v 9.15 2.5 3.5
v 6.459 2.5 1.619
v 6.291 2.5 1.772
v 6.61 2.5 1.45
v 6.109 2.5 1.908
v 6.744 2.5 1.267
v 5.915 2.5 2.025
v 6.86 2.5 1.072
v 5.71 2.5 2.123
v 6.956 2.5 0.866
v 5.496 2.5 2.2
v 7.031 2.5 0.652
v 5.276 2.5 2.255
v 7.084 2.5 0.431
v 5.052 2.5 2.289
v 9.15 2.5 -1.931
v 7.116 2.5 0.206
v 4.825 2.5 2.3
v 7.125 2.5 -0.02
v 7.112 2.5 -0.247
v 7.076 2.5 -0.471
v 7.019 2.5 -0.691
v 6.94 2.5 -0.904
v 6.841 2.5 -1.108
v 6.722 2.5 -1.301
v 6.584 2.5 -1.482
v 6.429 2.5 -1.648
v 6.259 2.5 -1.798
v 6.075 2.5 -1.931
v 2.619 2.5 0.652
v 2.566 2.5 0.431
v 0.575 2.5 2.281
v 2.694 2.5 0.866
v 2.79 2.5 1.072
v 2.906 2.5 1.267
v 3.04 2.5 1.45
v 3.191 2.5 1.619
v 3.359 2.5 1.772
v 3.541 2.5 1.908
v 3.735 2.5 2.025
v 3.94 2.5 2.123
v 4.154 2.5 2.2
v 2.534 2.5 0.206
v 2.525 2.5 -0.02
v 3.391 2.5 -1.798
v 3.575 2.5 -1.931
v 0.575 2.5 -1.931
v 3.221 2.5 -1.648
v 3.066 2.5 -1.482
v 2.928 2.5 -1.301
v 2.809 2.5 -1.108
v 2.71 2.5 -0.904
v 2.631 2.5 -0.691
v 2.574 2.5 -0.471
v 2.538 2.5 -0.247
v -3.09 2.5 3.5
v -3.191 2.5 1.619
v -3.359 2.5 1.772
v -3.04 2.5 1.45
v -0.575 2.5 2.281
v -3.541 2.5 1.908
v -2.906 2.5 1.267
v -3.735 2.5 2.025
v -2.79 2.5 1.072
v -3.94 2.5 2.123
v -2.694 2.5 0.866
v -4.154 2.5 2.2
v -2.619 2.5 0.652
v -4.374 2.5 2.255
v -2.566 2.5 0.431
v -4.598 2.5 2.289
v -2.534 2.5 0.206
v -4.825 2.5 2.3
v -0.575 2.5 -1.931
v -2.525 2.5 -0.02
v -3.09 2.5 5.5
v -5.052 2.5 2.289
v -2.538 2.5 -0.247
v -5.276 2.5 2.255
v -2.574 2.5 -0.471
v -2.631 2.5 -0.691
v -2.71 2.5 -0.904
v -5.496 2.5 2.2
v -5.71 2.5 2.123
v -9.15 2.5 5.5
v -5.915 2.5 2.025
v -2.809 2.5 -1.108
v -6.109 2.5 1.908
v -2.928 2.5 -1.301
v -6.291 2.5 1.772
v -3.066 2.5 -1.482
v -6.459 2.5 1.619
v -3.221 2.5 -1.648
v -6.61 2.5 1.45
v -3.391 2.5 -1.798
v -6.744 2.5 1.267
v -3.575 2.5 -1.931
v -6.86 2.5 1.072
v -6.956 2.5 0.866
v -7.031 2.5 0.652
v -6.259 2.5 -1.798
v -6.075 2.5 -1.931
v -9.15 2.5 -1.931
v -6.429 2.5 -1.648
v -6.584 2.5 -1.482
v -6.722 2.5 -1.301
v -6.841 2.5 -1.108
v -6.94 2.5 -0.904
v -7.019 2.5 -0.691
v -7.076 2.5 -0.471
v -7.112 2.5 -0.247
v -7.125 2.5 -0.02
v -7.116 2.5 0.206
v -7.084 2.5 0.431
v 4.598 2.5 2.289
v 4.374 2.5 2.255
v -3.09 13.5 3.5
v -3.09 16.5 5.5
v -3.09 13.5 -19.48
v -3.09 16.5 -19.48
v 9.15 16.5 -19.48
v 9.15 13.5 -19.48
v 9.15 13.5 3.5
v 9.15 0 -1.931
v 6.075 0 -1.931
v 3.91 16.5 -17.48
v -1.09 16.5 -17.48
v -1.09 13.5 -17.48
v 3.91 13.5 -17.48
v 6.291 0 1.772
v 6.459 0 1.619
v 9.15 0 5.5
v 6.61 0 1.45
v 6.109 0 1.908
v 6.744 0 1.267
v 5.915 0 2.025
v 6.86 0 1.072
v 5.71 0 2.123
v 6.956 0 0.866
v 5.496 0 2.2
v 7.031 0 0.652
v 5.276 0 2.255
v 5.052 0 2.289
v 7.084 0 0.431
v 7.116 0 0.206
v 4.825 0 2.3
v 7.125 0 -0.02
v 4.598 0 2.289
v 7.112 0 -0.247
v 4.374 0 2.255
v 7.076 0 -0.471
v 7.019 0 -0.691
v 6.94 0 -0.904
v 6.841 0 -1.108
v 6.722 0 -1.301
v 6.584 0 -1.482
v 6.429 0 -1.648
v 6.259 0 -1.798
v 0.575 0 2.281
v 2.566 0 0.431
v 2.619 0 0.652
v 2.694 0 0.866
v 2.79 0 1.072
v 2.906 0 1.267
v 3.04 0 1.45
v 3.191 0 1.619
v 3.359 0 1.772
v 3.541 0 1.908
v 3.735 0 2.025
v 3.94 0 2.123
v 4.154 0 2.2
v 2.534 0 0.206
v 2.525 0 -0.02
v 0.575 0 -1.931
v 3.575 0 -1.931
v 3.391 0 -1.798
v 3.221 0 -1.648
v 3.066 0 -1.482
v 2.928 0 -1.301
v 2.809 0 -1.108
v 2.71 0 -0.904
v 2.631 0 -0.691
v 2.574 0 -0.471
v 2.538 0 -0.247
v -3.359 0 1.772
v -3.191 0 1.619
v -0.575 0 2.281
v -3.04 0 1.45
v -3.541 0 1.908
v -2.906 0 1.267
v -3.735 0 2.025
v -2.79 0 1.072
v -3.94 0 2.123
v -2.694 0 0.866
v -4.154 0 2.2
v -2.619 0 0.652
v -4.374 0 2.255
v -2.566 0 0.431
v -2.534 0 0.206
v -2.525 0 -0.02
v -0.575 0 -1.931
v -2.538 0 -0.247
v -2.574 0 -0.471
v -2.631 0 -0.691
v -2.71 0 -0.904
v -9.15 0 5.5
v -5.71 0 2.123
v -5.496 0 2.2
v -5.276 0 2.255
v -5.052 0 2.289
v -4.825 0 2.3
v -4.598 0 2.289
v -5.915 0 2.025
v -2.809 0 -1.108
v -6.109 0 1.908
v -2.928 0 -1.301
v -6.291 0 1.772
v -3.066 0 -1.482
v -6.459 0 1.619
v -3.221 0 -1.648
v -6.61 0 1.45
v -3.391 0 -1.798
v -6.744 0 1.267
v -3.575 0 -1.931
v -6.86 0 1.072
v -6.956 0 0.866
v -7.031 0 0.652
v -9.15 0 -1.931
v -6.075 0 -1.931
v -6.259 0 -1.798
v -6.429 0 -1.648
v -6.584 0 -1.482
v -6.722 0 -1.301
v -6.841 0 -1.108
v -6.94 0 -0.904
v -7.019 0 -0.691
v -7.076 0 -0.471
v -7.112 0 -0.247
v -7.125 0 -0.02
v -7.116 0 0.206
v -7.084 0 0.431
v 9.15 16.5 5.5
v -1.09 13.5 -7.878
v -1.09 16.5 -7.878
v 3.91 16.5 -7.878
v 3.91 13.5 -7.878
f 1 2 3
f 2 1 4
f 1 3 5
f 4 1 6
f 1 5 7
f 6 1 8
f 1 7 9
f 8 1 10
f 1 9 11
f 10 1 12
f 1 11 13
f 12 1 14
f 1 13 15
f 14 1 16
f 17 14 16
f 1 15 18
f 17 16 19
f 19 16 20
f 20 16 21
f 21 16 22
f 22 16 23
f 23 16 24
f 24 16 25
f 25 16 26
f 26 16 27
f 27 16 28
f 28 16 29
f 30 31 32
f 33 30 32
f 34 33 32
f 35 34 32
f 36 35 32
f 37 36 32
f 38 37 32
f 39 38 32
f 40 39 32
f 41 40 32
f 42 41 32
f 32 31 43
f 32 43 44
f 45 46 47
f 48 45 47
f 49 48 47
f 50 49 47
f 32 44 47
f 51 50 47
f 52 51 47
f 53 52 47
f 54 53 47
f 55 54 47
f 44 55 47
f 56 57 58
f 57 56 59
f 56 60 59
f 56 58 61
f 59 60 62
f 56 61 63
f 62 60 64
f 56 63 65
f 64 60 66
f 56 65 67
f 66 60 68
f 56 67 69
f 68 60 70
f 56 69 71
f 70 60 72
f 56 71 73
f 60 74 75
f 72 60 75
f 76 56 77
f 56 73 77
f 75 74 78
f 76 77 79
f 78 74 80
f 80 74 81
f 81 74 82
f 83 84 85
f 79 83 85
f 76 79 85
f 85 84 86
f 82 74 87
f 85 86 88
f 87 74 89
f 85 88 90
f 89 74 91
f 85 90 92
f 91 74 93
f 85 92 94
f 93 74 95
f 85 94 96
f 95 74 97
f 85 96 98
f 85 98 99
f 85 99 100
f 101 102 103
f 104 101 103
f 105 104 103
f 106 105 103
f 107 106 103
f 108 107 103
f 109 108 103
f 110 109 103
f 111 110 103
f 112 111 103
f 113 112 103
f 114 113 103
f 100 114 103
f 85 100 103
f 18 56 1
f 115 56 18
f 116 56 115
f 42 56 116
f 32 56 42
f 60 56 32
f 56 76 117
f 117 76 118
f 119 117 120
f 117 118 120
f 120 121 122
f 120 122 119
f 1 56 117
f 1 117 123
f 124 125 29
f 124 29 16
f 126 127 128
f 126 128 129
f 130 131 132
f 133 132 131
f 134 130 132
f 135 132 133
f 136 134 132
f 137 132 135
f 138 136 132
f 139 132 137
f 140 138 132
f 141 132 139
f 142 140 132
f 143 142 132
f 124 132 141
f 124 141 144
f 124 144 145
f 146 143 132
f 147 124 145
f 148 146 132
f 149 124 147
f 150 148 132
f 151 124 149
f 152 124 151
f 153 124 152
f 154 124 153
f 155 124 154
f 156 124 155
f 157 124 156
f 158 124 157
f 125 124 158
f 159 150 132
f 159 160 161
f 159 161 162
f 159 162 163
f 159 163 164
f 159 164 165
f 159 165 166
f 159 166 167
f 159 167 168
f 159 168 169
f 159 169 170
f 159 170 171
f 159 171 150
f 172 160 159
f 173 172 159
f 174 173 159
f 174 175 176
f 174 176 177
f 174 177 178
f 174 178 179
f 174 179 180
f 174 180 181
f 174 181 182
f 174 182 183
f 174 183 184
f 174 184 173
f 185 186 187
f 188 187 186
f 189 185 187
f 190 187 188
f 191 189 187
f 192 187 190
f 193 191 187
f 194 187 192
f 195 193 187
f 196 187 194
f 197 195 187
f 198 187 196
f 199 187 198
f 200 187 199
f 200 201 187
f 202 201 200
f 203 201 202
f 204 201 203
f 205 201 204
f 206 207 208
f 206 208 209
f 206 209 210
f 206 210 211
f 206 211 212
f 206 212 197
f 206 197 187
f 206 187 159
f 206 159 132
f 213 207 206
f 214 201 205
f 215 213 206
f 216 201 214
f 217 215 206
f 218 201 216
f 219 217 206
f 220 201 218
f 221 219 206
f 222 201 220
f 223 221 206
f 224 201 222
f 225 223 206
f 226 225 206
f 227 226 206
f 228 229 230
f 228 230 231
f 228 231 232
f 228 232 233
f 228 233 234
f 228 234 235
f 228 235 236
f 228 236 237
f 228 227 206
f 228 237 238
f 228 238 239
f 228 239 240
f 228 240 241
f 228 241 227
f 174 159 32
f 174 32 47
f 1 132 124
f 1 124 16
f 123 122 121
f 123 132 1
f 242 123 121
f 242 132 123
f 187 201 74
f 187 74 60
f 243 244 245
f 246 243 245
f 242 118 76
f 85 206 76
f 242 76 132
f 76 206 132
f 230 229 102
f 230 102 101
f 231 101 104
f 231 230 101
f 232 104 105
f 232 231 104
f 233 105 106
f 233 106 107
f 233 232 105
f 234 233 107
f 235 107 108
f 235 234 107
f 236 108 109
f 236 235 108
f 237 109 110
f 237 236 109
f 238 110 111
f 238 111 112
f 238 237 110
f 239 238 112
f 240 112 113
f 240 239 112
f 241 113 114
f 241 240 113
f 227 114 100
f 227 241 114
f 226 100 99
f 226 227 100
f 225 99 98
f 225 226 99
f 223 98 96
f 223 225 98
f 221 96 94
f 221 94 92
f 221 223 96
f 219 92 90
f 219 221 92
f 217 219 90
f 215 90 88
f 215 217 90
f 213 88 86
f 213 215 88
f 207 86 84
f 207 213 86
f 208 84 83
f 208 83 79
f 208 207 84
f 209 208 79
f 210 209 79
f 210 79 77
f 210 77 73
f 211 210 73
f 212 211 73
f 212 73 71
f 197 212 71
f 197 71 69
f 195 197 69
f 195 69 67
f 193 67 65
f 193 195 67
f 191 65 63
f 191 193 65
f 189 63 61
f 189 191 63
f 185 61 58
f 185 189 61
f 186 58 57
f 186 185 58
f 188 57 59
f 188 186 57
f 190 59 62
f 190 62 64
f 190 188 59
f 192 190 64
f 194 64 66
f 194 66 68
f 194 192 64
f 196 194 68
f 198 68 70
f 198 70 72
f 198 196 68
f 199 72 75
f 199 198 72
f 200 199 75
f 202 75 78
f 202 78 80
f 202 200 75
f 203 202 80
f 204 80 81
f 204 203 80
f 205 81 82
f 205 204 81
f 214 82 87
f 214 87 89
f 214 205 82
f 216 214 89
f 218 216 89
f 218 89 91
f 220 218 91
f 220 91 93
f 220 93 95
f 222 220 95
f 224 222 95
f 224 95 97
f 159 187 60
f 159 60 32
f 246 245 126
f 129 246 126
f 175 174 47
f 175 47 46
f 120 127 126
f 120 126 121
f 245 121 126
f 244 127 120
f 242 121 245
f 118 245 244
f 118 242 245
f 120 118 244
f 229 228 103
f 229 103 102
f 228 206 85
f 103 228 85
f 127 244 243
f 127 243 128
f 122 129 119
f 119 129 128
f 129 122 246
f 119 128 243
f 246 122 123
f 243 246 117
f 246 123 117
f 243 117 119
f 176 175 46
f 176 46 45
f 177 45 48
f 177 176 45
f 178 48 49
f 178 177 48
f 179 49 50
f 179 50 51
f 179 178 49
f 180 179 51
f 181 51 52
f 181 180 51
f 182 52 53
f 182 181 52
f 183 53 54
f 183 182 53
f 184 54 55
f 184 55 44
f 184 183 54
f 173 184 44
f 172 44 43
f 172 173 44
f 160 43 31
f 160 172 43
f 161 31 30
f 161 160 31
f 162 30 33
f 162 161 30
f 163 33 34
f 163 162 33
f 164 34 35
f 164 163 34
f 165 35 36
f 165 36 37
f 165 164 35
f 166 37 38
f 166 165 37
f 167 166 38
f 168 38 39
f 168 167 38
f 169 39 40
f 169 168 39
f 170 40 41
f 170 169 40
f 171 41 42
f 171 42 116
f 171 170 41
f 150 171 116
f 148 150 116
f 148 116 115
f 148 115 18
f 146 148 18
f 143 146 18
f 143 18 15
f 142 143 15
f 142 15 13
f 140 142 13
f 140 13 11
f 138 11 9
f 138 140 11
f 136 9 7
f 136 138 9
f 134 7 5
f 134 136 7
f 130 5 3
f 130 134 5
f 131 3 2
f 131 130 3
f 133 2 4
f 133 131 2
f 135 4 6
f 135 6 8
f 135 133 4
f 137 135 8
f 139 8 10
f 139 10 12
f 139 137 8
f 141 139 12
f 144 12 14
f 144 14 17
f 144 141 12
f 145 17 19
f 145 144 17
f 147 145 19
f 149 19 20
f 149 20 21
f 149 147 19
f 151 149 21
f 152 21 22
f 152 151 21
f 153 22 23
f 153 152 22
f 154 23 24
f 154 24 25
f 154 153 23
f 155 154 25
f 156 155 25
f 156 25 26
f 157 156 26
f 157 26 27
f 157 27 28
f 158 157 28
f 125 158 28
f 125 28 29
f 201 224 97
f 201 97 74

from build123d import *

# Parameters (mm, degrees)
BOSS_EXTRUDE1_DEPTH = 2.5
SKETCH2_W           = 18.3
SKETCH2_H           = 2
BOSS_EXTRUDE2_DEPTH = 14
SKETCH3_W           = 18.3
SKETCH3_H           = 3
BOSS_EXTRUDE3_DEPTH = 22.98
SKETCH4_W           = 5
SKETCH4_H           = 9.60227247
SKETCH4_W_2         = 6.06
SKETCH4_H_2         = 22.98
CUT_EXTRUDE1_DEPTH  = 3
SKETCH5_W           = 6.06
SKETCH5_H           = 14
CUT_EXTRUDE2_DEPTH  = 2


with BuildPart() as part:
    # Sketch1 → Boss-Extrude1 (new body)
    with BuildSketch(Plane(origin=(0, 0, 0), x_dir=(1, 0, 0), z_dir=(0, 1, 0))):
        with BuildLine():
            Line((-9.15, -3.5), (-9.15, 1.930673458))
            Line((-9.15, 1.930673458), (-6.075, 1.930673458))
            ThreePointArc((-6.075, 1.930673458), (-4.825, -2.3), (-3.575, 1.930673458))
            Line((-3.575, 1.930673458), (-0.575, 1.930673458))
            Line((-0.575, 1.930673458), (-0.575, -2.281126238))
            Line((-0.575, -2.281126238), (0.575, -2.281126238))
            Line((0.575, -2.281126238), (0.575, 1.930673458))
            Line((0.575, 1.930673458), (3.575, 1.930673458))
            ThreePointArc((3.575, 1.930673458), (4.825, -2.3), (6.075, 1.930673458))
            Line((6.075, 1.930673458), (9.15, 1.930673458))
            Line((9.15, 1.930673458), (9.15, -3.5))
            Line((9.15, -3.5), (9.15, -5.5))
            Line((9.15, -5.5), (-9.15, -5.5))
            Line((-9.15, -5.5), (-9.15, -3.5))
        make_face()
    extrude(amount=BOSS_EXTRUDE1_DEPTH)

    # Sketch2 → Boss-Extrude2 (add)
    with BuildSketch(Plane(origin=(0, 2.5, 0), x_dir=(1, 0, 0), z_dir=(0, 1, 0))):
        with Locations((0, -4.5)):
            Rectangle(SKETCH2_W, SKETCH2_H)
    extrude(amount=BOSS_EXTRUDE2_DEPTH)

    # Sketch3 → Boss-Extrude3 (add)
    with BuildSketch(Plane(origin=(0, 0, 3.5), x_dir=(-1, 0, 0), z_dir=(0, 0, -1))):
        with Locations((0, 15)):
            Rectangle(SKETCH3_W, SKETCH3_H)
    extrude(amount=BOSS_EXTRUDE3_DEPTH)

    # Sketch4 → Cut-Extrude1 (cut)
    with BuildSketch(Plane(origin=(0, 16.5, 0), x_dir=(1, 0, 0), z_dir=(0, 1, 0))):
        with Locations((1.41, 12.678863765)):
            Rectangle(SKETCH4_W, SKETCH4_H)
        with Locations((-6.12, 7.99)):
            Rectangle(SKETCH4_W_2, SKETCH4_H_2)
    extrude(amount=-CUT_EXTRUDE1_DEPTH, mode=Mode.SUBTRACT)

    # Sketch5 → Cut-Extrude2 (cut)
    with BuildSketch(Plane.XY.offset(5.5)):
        with Locations((-6.12, 9.5)):
            Rectangle(SKETCH5_W, SKETCH5_H)
    extrude(amount=-CUT_EXTRUDE2_DEPTH, mode=Mode.SUBTRACT)


solid = part.part
